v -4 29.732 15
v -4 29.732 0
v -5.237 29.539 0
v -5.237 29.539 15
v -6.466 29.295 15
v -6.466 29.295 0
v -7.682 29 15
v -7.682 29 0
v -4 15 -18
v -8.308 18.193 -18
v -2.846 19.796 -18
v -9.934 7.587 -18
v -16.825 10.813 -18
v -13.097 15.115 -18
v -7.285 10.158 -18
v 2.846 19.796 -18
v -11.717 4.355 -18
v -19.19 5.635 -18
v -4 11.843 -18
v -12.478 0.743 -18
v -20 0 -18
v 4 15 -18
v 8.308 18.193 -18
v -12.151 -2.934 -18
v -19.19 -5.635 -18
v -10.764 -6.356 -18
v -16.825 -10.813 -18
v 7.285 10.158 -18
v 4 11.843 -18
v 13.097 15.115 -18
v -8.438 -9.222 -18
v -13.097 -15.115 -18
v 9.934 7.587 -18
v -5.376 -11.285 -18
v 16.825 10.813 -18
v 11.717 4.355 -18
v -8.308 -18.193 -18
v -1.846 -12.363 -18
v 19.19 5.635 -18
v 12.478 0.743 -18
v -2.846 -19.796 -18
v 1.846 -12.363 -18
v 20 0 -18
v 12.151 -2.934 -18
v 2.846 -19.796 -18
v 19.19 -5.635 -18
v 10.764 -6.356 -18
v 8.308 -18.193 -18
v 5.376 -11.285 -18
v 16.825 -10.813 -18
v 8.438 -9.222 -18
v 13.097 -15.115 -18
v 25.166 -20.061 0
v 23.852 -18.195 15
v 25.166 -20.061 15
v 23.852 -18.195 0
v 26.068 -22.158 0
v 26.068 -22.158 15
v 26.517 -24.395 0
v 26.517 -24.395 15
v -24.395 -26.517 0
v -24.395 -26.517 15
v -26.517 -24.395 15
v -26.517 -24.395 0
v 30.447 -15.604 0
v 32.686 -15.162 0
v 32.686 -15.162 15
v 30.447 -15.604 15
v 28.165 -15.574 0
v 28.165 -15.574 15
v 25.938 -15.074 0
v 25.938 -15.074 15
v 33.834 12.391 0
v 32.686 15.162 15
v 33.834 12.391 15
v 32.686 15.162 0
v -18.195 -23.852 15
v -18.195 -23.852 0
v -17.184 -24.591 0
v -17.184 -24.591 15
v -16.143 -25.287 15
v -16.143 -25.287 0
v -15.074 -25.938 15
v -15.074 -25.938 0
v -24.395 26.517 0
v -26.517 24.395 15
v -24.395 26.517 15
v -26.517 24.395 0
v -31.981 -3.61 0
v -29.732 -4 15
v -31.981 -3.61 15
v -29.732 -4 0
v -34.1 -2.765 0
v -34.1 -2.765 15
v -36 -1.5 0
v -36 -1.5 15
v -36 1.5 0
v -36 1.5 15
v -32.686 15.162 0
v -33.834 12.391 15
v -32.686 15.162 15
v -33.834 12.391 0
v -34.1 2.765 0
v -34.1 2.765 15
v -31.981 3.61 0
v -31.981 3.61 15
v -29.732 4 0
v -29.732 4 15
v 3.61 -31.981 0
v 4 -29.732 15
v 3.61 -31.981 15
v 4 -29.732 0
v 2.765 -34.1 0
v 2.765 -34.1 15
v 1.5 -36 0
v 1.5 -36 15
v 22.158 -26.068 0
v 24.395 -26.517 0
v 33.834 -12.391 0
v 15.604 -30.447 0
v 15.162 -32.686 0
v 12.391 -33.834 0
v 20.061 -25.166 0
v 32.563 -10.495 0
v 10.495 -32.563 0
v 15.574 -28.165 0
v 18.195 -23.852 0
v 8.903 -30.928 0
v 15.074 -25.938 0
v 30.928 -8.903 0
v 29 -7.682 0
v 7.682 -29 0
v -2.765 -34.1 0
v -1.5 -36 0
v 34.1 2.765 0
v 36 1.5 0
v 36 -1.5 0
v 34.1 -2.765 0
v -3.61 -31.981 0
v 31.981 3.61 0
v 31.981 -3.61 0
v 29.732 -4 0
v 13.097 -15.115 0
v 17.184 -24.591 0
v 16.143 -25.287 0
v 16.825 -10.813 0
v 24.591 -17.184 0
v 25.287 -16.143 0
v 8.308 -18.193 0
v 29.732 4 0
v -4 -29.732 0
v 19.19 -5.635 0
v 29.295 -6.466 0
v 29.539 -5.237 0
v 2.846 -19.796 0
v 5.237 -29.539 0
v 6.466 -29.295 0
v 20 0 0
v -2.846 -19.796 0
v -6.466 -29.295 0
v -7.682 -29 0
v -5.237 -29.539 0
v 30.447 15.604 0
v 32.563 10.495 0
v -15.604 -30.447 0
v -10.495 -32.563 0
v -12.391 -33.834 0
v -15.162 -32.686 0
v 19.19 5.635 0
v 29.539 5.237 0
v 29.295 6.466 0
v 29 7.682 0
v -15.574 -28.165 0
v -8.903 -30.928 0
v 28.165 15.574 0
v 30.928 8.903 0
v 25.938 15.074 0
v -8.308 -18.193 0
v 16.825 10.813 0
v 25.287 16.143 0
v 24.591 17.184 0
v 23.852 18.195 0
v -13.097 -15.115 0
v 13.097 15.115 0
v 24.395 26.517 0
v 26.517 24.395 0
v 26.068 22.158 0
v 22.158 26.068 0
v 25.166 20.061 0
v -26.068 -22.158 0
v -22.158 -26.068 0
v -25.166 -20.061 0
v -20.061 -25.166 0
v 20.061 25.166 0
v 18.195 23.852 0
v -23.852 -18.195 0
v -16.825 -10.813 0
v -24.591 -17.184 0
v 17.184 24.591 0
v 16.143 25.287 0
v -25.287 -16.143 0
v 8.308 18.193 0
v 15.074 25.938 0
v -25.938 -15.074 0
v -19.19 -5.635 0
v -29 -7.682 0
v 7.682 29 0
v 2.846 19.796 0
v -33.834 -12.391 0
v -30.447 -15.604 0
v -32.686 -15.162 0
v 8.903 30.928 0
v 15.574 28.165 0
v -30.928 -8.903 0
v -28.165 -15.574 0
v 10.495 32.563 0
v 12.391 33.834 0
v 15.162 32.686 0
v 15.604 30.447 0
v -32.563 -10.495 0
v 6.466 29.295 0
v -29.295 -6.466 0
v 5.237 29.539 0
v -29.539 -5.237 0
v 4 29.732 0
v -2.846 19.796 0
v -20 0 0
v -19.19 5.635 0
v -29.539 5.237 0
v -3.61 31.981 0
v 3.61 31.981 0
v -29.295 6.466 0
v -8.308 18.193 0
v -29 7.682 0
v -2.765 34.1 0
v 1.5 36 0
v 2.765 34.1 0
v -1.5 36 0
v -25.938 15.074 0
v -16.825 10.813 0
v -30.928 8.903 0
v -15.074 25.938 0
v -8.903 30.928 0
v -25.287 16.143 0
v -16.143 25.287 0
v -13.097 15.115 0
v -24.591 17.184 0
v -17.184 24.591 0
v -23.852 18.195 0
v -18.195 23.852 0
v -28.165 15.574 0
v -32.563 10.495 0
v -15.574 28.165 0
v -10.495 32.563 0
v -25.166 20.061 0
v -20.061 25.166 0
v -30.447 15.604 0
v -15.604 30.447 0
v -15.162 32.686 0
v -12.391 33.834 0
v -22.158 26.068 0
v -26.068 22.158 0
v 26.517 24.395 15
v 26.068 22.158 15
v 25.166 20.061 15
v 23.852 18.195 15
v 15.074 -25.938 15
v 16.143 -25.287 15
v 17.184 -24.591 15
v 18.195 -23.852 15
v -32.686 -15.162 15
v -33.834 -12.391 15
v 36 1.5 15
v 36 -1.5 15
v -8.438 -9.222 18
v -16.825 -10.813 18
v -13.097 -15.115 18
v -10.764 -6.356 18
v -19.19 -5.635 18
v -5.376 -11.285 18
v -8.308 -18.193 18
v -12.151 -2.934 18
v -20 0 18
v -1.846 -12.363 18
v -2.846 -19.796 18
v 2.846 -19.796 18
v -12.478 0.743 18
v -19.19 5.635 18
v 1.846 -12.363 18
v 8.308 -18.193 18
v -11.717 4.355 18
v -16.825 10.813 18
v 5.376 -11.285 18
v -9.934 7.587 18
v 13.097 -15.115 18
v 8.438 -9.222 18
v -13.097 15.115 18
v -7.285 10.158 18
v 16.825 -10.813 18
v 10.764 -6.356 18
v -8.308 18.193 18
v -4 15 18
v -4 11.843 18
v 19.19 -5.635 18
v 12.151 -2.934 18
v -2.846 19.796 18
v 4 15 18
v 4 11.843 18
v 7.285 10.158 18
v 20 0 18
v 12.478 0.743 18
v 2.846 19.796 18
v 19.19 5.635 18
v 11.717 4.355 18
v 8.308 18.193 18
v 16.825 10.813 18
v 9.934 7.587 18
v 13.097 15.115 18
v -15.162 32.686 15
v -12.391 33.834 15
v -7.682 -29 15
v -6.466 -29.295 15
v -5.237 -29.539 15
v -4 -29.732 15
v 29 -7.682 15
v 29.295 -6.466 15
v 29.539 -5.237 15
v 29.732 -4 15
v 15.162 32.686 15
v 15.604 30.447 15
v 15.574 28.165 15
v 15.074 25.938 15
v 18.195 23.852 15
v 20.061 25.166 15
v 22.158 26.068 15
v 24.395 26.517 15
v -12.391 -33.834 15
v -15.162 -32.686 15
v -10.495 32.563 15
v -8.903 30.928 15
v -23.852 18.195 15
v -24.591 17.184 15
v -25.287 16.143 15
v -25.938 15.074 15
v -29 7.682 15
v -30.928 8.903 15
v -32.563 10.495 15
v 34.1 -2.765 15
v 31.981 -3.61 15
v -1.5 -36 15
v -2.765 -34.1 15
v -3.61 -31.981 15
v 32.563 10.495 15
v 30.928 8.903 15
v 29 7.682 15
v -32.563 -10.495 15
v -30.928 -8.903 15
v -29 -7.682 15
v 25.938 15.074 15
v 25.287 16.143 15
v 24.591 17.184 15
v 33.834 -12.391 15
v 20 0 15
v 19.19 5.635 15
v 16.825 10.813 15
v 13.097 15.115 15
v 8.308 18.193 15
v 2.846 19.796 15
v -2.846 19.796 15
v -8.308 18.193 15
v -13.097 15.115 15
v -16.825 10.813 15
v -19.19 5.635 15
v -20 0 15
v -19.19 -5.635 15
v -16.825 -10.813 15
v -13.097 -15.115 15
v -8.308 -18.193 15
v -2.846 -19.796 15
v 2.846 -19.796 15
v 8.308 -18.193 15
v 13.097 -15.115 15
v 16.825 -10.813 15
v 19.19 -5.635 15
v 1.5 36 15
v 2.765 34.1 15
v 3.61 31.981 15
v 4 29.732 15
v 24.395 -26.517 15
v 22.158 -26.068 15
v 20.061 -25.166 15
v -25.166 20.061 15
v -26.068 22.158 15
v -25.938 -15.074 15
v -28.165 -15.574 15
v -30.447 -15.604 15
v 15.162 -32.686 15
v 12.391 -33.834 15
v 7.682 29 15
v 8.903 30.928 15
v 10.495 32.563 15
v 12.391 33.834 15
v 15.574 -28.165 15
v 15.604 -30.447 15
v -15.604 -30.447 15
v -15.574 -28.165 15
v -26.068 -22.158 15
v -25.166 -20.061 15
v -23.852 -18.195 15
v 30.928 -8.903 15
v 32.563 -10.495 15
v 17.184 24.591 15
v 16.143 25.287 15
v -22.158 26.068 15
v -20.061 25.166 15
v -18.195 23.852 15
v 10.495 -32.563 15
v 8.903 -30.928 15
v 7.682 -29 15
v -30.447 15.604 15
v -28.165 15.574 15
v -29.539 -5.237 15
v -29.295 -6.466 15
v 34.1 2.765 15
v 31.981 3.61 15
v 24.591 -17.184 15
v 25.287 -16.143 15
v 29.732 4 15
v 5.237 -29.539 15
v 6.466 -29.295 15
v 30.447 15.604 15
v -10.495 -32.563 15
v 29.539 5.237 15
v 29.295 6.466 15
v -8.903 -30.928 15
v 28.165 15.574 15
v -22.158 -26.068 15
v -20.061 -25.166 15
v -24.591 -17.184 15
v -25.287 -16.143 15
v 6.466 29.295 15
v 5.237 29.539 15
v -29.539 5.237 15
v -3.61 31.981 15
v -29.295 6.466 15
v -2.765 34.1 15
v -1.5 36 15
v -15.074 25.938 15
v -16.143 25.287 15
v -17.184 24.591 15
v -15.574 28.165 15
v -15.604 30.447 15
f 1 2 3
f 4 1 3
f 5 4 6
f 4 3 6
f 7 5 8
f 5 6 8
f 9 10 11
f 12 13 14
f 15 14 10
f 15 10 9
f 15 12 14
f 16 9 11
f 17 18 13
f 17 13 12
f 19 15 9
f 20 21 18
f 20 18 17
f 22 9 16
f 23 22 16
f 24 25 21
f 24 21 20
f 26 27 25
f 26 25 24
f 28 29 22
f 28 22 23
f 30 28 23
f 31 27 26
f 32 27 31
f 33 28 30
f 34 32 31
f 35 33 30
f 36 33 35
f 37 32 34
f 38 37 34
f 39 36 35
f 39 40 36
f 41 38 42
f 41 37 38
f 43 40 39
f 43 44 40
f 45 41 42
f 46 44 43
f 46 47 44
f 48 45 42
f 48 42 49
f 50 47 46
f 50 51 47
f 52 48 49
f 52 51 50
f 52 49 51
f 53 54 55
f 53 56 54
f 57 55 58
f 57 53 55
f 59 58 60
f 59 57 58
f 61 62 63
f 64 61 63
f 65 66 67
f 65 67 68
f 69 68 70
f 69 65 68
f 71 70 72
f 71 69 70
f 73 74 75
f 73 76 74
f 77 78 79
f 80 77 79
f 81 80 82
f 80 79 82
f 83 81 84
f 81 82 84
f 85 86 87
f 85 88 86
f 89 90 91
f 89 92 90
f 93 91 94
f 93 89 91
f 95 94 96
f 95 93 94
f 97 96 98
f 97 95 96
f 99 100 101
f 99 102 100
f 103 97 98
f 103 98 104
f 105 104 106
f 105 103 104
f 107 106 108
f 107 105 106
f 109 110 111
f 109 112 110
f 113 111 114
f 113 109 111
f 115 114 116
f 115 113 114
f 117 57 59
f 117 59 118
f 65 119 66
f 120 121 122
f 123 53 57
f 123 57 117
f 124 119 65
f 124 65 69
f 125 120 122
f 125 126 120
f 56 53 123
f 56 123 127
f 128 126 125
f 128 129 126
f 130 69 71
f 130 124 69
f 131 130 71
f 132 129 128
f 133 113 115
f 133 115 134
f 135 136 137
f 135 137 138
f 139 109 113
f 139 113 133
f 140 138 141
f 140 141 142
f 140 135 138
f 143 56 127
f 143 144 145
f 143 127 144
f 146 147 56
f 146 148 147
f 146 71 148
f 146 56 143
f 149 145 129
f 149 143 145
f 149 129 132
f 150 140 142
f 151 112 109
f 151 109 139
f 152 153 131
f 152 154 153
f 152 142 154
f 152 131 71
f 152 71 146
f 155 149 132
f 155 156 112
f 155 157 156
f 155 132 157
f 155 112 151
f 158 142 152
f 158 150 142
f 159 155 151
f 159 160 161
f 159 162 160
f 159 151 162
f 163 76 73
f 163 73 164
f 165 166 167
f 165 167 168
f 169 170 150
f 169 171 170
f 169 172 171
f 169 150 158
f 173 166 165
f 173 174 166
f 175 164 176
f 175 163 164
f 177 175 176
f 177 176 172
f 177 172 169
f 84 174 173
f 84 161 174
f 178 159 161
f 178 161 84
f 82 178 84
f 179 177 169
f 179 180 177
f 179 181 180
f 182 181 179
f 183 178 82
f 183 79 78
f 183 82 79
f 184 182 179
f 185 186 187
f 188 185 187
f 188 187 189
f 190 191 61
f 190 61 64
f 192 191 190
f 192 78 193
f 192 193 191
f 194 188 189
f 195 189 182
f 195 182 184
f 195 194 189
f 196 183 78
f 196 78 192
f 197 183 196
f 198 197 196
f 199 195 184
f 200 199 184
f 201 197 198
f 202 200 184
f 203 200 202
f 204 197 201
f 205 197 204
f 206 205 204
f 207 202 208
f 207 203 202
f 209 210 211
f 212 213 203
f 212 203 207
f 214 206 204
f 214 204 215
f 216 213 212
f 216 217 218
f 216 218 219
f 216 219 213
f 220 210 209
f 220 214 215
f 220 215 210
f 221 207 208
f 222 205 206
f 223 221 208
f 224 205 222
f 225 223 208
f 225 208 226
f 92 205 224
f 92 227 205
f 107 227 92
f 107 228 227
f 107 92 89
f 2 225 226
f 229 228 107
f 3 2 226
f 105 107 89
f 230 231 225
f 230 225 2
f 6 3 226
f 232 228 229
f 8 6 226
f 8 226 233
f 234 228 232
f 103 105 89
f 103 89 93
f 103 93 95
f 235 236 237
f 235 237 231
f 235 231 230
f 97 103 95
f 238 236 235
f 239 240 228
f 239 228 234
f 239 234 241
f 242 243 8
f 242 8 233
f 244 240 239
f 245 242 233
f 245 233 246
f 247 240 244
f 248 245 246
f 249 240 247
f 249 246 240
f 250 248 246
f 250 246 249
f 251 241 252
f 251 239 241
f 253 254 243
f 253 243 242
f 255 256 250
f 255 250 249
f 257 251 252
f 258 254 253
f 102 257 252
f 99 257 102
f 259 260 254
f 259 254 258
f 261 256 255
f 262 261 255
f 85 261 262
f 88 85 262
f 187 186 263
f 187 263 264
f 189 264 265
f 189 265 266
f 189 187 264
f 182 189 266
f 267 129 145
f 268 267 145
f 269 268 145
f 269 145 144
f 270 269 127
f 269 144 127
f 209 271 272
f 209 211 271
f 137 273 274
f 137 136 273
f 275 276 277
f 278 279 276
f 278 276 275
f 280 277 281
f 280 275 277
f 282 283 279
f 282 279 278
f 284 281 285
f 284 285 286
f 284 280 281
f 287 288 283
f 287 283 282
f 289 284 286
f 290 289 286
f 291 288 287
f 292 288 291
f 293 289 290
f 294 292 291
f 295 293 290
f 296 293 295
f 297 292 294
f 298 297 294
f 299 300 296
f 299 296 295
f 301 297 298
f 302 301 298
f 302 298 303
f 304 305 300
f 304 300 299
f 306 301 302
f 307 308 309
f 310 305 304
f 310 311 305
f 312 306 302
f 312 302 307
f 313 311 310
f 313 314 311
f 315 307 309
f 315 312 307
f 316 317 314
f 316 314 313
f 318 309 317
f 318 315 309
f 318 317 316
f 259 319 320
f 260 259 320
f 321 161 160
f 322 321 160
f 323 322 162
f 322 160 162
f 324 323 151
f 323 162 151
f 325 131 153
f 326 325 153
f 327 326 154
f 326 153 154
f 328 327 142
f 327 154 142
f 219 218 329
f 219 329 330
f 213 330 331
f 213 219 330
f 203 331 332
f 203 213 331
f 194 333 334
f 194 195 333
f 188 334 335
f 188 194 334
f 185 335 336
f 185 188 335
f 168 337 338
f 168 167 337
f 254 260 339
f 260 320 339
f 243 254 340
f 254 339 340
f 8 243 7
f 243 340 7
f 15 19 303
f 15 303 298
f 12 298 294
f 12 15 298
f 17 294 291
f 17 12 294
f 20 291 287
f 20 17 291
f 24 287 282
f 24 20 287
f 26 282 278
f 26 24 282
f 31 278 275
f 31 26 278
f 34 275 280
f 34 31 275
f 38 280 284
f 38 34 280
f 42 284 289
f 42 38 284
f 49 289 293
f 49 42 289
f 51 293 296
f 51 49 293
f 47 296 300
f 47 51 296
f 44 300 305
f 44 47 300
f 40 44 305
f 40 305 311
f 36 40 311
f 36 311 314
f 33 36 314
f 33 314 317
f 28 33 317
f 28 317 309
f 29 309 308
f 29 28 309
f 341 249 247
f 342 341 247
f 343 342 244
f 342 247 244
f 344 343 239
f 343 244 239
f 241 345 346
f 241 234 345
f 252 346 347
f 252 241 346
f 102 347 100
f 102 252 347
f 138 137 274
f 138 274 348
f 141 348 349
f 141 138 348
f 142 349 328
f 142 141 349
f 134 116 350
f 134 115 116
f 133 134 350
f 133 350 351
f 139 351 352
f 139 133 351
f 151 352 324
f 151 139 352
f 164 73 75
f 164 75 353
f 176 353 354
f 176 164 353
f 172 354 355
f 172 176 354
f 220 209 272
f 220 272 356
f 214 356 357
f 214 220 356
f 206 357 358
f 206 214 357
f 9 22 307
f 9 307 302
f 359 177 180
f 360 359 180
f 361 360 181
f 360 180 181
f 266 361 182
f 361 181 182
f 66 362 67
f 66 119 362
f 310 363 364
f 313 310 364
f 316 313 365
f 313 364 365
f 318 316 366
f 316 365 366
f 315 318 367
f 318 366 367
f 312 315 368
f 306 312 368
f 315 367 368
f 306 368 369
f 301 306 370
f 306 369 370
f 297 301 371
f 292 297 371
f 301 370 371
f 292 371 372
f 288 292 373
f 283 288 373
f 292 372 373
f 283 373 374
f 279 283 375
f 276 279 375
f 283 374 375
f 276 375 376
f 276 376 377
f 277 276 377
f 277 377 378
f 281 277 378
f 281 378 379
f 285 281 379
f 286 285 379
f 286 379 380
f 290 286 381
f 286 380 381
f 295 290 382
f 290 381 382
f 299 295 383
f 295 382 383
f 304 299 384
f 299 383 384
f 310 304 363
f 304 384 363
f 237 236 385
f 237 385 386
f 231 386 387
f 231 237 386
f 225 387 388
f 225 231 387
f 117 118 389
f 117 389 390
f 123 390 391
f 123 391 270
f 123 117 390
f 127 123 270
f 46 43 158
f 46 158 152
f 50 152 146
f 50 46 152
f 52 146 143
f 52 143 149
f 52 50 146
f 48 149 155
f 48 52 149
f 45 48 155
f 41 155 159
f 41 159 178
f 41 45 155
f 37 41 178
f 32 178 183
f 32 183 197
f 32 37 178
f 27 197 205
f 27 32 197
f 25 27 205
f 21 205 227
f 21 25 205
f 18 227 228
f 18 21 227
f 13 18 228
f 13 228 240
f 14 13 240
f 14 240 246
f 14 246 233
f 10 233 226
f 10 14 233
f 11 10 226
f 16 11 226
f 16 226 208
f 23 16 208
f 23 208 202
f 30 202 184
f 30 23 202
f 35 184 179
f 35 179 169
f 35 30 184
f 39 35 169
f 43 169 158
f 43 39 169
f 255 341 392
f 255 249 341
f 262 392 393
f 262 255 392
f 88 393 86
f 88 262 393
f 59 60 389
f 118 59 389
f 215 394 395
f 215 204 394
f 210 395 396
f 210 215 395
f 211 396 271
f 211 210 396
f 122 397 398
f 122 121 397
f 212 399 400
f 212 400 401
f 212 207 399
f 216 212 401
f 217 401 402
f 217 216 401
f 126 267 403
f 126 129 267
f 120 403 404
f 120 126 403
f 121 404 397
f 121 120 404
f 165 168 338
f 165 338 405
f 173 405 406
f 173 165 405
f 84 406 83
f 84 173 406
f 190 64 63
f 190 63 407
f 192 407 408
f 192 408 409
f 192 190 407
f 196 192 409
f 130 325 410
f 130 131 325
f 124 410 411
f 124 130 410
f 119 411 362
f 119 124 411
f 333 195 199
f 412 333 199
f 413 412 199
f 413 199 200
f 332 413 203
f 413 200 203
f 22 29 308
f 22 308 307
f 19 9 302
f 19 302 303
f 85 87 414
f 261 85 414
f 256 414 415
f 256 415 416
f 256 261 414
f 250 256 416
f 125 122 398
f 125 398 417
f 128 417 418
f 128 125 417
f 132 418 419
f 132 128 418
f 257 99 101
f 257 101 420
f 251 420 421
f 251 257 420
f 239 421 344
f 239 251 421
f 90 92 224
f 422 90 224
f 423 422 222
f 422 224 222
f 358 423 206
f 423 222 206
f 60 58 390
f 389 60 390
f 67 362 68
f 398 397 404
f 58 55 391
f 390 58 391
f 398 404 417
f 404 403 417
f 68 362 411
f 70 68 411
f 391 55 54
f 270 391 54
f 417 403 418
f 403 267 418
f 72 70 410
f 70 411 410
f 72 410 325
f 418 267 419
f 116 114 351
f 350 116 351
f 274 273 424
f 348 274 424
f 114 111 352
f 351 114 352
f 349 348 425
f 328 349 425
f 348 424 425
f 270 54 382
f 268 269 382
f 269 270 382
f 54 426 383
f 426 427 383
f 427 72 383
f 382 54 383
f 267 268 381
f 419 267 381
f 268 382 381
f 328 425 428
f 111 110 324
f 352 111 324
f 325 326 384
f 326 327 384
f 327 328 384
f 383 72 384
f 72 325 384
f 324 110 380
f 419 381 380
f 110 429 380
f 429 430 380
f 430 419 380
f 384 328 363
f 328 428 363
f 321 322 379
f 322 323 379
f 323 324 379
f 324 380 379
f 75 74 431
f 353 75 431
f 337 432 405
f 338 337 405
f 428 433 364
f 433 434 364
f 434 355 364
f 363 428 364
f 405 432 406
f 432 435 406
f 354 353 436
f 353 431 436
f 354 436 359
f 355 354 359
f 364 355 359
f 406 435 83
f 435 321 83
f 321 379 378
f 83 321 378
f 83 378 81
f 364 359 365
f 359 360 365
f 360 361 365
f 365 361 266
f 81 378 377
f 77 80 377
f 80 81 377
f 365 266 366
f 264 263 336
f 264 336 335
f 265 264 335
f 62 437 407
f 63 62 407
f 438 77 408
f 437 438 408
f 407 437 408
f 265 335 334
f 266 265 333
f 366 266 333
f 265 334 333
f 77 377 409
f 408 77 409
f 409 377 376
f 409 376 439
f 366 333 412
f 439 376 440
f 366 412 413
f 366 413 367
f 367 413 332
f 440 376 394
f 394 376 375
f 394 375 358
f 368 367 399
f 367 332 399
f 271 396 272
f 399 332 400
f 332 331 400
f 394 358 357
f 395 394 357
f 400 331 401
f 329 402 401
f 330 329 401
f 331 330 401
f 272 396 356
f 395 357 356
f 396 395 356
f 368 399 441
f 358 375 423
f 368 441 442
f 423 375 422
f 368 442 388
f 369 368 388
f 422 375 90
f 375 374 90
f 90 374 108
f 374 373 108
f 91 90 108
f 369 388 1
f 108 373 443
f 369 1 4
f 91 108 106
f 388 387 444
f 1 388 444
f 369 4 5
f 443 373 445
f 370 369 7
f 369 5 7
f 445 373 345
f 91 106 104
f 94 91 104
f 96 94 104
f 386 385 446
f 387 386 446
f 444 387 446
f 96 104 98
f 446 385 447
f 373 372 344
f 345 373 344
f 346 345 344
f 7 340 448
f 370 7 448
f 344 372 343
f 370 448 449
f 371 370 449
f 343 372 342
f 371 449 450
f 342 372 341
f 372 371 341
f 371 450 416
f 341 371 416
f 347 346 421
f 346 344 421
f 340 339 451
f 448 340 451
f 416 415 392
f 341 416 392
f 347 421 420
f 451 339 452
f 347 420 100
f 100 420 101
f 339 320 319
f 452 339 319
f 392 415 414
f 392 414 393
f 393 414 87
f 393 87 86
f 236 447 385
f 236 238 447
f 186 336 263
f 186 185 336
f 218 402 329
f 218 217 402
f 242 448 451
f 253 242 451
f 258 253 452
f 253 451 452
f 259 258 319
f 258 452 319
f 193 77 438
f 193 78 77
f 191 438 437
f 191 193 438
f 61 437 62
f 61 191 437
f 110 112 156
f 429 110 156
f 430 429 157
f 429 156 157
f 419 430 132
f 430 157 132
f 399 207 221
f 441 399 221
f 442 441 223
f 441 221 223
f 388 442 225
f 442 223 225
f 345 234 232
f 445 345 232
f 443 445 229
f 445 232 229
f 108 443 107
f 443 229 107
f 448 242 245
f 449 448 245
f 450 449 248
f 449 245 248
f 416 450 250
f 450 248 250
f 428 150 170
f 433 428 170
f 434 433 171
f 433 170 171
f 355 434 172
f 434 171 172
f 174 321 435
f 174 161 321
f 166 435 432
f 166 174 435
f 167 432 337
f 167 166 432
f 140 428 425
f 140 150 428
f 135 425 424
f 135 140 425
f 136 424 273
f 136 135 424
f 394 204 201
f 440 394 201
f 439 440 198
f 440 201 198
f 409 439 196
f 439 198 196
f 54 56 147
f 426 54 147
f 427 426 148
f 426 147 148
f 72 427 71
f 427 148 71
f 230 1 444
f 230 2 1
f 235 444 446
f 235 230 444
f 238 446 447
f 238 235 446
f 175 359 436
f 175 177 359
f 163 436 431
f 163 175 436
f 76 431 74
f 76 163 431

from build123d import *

# Parameters (mm, degrees)
SKETCH1_R           = 30
BOSS_EXTRUDE1_DEPTH = 15
SKETCH2_R           = 20
BOSS_EXTRUDE2_DEPTH = 3
BOSS_EXTRUDE3_START = 18
SKETCH3_R           = 20
BOSS_EXTRUDE3_DEPTH = 18
CUT_EXTRUDE1_DEPTH  = 56.641710973
BOSS_EXTRUDE5_DEPTH = 7.5


with BuildPart() as part:
    # Sketch1 → Boss-Extrude1 (new body)
    with BuildSketch(Plane.XY):
        Circle(SKETCH1_R)
    extrude(amount=BOSS_EXTRUDE1_DEPTH)

    # Sketch2 → Boss-Extrude2 (add)
    with BuildSketch(Plane.XY.offset(15)):
        Circle(SKETCH2_R)
    extrude(amount=BOSS_EXTRUDE2_DEPTH)

    # Sketch3 → Boss-Extrude3 (add)
    with BuildSketch(Plane(origin=(0, 0, 0), x_dir=(-1, 0, 0), z_dir=(0, 0, -1)).offset(BOSS_EXTRUDE3_START)):
        with Locations(Location((0, 0, 0), (0, 0, 180))):
            Circle(SKETCH3_R)
    extrude(amount=-BOSS_EXTRUDE3_DEPTH)

    # Sketch4 → Cut-Extrude1 (cut, through all)
    with BuildSketch(Plane(origin=(0, 0, -18), x_dir=(-1, 0, 0), z_dir=(0, 0, -1))):
        with BuildLine():
            Line((-4, 15), (4, 15))
            Line((4, 15), (4, 11.842719282))
            ThreePointArc((4, 11.842719282), (0, -12.5), (-4, 11.842719282))
            Line((-4, 11.842719282), (-4, 15))
        make_face()
    extrude(amount=-CUT_EXTRUDE1_DEPTH, mode=Mode.SUBTRACT)

    # Sketch5 → Boss-Extrude5 (add, symmetric)
    with BuildSketch(Plane.XY.offset(7.5)):
        with BuildLine():
            Line((-1.5, 36), (1.5, 36))
            ThreePointArc((1.5, 36), (3.242504384, 33.062509074), (4, 29.732137495))
            ThreePointArc((4, 29.732137495), (0, 30), (-4, 29.732137495))
            ThreePointArc((-4, 29.732137495), (-3.242504384, 33.062509074), (-1.5, 36))
        make_face()
        with BuildLine():
            Line((12.390784266, 33.833688319), (15.162422864, 32.685638022))
            ThreePointArc((15.162422864, 32.685638022), (15.64815789, 29.30492272), (15.073514558, 25.93817956))
            ThreePointArc((15.073514558, 25.93817956), (11.480502971, 27.716385975), (7.682478298, 28.999647019))
            ThreePointArc((7.682478298, 28.999647019), (9.656791021, 31.786628134), (12.390784266, 33.833688319))
        make_face()
        with BuildLine():
            Line((24.395183951, 26.516504294), (26.516504295, 24.395183951))
            ThreePointArc((26.516504295, 24.395183951), (25.671521208, 21.085927531), (23.852223166, 18.195368917))
            ThreePointArc((23.852223166, 18.195368917), (21.213203436, 21.213203436), (18.195368917, 23.852223166))
            ThreePointArc((18.195368917, 23.852223166), (21.085927531, 25.671521208), (24.395183951, 26.516504294))
        make_face()
        with BuildLine():
            Line((32.685638022, 15.162422864), (33.833688319, 12.390784266))
            ThreePointArc((33.833688319, 12.390784266), (31.786628135, 9.656791021), (28.999647019, 7.682478298))
            ThreePointArc((28.999647019, 7.682478298), (27.716385975, 11.480502971), (25.93817956, 15.073514558))
            ThreePointArc((25.93817956, 15.073514558), (29.30492272, 15.64815789), (32.685638022, 15.162422864))
        make_face()
        with BuildLine():
            Line((36, 1.5), (36, -1.5))
            ThreePointArc((36, -1.5), (33.062509074, -3.242504384), (29.732137495, -4))
            ThreePointArc((29.732137495, -4), (30, 0), (29.732137495, 4))
            ThreePointArc((29.732137495, 4), (33.062509074, 3.242504384), (36, 1.5))
        make_face()
        with BuildLine():
            Line((33.833688319, -12.390784266), (32.685638022, -15.162422864))
            ThreePointArc((32.685638022, -15.162422864), (29.30492272, -15.64815789), (25.93817956, -15.073514558))
            ThreePointArc((25.93817956, -15.073514558), (27.716385975, -11.480502971), (28.999647019, -7.682478298))
            ThreePointArc((28.999647019, -7.682478298), (31.786628135, -9.656791021), (33.833688319, -12.390784266))
        make_face()
        with BuildLine():
            Line((26.516504295, -24.395183951), (24.395183951, -26.516504295))
            ThreePointArc((24.395183951, -26.516504295), (21.085927531, -25.671521208), (18.195368917, -23.852223166))
            ThreePointArc((18.195368917, -23.852223166), (21.213203436, -21.213203436), (23.852223166, -18.195368917))
            ThreePointArc((23.852223166, -18.195368917), (25.671521208, -21.085927531), (26.516504295, -24.395183951))
        make_face()
        with BuildLine():
            Line((15.162422864, -32.685638022), (12.390784266, -33.833688319))
            ThreePointArc((12.390784266, -33.833688319), (9.656791021, -31.786628135), (7.682478298, -28.999647019))
            ThreePointArc((7.682478298, -28.999647019), (11.480502971, -27.716385975), (15.073514558, -25.93817956))
            ThreePointArc((15.073514558, -25.93817956), (15.64815789, -29.30492272), (15.162422864, -32.685638022))
        make_face()
        with BuildLine():
            Line((1.5, -36), (-1.5, -36))
            ThreePointArc((-1.5, -36), (-3.242504384, -33.062509074), (-4, -29.732137495))
            ThreePointArc((-4, -29.732137495), (0, -30), (4, -29.732137495))
            ThreePointArc((4, -29.732137495), (3.242504384, -33.062509074), (1.5, -36))
        make_face()
        with BuildLine():
            Line((-12.390784266, -33.833688319), (-15.162422864, -32.685638022))
            ThreePointArc((-15.162422864, -32.685638022), (-15.64815789, -29.30492272), (-15.073514558, -25.93817956))
            ThreePointArc((-15.073514558, -25.93817956), (-11.480502971, -27.716385975), (-7.682478298, -28.999647019))
            ThreePointArc((-7.682478298, -28.999647019), (-9.656791021, -31.786628135), (-12.390784266, -33.833688319))
        make_face()
        with BuildLine():
            Line((-24.395183951, -26.516504295), (-26.516504295, -24.395183951))
            ThreePointArc((-26.516504295, -24.395183951), (-25.671521208, -21.085927531), (-23.852223166, -18.195368917))
            ThreePointArc((-23.852223166, -18.195368917), (-21.213203436, -21.213203436), (-18.195368917, -23.852223166))
            ThreePointArc((-18.195368917, -23.852223166), (-21.085927531, -25.671521208), (-24.395183951, -26.516504295))
        make_face()
        with BuildLine():
            Line((-32.685638022, -15.162422864), (-33.833688319, -12.390784266))
            ThreePointArc((-33.833688319, -12.390784266), (-31.786628135, -9.656791021), (-28.999647019, -7.682478298))
            ThreePointArc((-28.999647019, -7.682478298), (-27.716385975, -11.480502971), (-25.93817956, -15.073514558))
            ThreePointArc((-25.93817956, -15.073514558), (-29.30492272, -15.64815789), (-32.685638022, -15.162422864))
        make_face()
        with BuildLine():
            Line((-36, -1.5), (-36, 1.5))
            ThreePointArc((-36, 1.5), (-33.062509074, 3.242504384), (-29.732137495, 4))
            ThreePointArc((-29.732137495, 4), (-30, 0), (-29.732137495, -4))
            ThreePointArc((-29.732137495, -4), (-33.062509074, -3.242504384), (-36, -1.5))
        make_face()
        with BuildLine():
            Line((-33.833688319, 12.390784266), (-32.685638022, 15.162422864))
            ThreePointArc((-32.685638022, 15.162422864), (-29.30492272, 15.64815789), (-25.93817956, 15.073514558))
            ThreePointArc((-25.93817956, 15.073514558), (-27.716385975, 11.480502971), (-28.999647019, 7.682478298))
            ThreePointArc((-28.999647019, 7.682478298), (-31.786628135, 9.656791021), (-33.833688319, 12.390784266))
        make_face()
        with BuildLine():
            Line((-26.516504295, 24.395183951), (-24.395183951, 26.516504294))
            ThreePointArc((-24.395183951, 26.516504294), (-21.085927531, 25.671521208), (-18.195368917, 23.852223166))
            ThreePointArc((-18.195368917, 23.852223166), (-21.213203436, 21.213203436), (-23.852223166, 18.195368917))
            ThreePointArc((-23.852223166, 18.195368917), (-25.671521208, 21.085927531), (-26.516504295, 24.395183951))
        make_face()
        with BuildLine():
            Line((-15.162422864, 32.685638022), (-12.390784266, 33.833688319))
            ThreePointArc((-12.390784266, 33.833688319), (-9.656791021, 31.786628134), (-7.682478298, 28.999647019))
            ThreePointArc((-7.682478298, 28.999647019), (-11.480502971, 27.716385975), (-15.073514558, 25.93817956))
            ThreePointArc((-15.073514558, 25.93817956), (-15.64815789, 29.30492272), (-15.162422864, 32.685638022))
        make_face()
    extrude(amount=BOSS_EXTRUDE5_DEPTH, both=True)


solid = part.part
